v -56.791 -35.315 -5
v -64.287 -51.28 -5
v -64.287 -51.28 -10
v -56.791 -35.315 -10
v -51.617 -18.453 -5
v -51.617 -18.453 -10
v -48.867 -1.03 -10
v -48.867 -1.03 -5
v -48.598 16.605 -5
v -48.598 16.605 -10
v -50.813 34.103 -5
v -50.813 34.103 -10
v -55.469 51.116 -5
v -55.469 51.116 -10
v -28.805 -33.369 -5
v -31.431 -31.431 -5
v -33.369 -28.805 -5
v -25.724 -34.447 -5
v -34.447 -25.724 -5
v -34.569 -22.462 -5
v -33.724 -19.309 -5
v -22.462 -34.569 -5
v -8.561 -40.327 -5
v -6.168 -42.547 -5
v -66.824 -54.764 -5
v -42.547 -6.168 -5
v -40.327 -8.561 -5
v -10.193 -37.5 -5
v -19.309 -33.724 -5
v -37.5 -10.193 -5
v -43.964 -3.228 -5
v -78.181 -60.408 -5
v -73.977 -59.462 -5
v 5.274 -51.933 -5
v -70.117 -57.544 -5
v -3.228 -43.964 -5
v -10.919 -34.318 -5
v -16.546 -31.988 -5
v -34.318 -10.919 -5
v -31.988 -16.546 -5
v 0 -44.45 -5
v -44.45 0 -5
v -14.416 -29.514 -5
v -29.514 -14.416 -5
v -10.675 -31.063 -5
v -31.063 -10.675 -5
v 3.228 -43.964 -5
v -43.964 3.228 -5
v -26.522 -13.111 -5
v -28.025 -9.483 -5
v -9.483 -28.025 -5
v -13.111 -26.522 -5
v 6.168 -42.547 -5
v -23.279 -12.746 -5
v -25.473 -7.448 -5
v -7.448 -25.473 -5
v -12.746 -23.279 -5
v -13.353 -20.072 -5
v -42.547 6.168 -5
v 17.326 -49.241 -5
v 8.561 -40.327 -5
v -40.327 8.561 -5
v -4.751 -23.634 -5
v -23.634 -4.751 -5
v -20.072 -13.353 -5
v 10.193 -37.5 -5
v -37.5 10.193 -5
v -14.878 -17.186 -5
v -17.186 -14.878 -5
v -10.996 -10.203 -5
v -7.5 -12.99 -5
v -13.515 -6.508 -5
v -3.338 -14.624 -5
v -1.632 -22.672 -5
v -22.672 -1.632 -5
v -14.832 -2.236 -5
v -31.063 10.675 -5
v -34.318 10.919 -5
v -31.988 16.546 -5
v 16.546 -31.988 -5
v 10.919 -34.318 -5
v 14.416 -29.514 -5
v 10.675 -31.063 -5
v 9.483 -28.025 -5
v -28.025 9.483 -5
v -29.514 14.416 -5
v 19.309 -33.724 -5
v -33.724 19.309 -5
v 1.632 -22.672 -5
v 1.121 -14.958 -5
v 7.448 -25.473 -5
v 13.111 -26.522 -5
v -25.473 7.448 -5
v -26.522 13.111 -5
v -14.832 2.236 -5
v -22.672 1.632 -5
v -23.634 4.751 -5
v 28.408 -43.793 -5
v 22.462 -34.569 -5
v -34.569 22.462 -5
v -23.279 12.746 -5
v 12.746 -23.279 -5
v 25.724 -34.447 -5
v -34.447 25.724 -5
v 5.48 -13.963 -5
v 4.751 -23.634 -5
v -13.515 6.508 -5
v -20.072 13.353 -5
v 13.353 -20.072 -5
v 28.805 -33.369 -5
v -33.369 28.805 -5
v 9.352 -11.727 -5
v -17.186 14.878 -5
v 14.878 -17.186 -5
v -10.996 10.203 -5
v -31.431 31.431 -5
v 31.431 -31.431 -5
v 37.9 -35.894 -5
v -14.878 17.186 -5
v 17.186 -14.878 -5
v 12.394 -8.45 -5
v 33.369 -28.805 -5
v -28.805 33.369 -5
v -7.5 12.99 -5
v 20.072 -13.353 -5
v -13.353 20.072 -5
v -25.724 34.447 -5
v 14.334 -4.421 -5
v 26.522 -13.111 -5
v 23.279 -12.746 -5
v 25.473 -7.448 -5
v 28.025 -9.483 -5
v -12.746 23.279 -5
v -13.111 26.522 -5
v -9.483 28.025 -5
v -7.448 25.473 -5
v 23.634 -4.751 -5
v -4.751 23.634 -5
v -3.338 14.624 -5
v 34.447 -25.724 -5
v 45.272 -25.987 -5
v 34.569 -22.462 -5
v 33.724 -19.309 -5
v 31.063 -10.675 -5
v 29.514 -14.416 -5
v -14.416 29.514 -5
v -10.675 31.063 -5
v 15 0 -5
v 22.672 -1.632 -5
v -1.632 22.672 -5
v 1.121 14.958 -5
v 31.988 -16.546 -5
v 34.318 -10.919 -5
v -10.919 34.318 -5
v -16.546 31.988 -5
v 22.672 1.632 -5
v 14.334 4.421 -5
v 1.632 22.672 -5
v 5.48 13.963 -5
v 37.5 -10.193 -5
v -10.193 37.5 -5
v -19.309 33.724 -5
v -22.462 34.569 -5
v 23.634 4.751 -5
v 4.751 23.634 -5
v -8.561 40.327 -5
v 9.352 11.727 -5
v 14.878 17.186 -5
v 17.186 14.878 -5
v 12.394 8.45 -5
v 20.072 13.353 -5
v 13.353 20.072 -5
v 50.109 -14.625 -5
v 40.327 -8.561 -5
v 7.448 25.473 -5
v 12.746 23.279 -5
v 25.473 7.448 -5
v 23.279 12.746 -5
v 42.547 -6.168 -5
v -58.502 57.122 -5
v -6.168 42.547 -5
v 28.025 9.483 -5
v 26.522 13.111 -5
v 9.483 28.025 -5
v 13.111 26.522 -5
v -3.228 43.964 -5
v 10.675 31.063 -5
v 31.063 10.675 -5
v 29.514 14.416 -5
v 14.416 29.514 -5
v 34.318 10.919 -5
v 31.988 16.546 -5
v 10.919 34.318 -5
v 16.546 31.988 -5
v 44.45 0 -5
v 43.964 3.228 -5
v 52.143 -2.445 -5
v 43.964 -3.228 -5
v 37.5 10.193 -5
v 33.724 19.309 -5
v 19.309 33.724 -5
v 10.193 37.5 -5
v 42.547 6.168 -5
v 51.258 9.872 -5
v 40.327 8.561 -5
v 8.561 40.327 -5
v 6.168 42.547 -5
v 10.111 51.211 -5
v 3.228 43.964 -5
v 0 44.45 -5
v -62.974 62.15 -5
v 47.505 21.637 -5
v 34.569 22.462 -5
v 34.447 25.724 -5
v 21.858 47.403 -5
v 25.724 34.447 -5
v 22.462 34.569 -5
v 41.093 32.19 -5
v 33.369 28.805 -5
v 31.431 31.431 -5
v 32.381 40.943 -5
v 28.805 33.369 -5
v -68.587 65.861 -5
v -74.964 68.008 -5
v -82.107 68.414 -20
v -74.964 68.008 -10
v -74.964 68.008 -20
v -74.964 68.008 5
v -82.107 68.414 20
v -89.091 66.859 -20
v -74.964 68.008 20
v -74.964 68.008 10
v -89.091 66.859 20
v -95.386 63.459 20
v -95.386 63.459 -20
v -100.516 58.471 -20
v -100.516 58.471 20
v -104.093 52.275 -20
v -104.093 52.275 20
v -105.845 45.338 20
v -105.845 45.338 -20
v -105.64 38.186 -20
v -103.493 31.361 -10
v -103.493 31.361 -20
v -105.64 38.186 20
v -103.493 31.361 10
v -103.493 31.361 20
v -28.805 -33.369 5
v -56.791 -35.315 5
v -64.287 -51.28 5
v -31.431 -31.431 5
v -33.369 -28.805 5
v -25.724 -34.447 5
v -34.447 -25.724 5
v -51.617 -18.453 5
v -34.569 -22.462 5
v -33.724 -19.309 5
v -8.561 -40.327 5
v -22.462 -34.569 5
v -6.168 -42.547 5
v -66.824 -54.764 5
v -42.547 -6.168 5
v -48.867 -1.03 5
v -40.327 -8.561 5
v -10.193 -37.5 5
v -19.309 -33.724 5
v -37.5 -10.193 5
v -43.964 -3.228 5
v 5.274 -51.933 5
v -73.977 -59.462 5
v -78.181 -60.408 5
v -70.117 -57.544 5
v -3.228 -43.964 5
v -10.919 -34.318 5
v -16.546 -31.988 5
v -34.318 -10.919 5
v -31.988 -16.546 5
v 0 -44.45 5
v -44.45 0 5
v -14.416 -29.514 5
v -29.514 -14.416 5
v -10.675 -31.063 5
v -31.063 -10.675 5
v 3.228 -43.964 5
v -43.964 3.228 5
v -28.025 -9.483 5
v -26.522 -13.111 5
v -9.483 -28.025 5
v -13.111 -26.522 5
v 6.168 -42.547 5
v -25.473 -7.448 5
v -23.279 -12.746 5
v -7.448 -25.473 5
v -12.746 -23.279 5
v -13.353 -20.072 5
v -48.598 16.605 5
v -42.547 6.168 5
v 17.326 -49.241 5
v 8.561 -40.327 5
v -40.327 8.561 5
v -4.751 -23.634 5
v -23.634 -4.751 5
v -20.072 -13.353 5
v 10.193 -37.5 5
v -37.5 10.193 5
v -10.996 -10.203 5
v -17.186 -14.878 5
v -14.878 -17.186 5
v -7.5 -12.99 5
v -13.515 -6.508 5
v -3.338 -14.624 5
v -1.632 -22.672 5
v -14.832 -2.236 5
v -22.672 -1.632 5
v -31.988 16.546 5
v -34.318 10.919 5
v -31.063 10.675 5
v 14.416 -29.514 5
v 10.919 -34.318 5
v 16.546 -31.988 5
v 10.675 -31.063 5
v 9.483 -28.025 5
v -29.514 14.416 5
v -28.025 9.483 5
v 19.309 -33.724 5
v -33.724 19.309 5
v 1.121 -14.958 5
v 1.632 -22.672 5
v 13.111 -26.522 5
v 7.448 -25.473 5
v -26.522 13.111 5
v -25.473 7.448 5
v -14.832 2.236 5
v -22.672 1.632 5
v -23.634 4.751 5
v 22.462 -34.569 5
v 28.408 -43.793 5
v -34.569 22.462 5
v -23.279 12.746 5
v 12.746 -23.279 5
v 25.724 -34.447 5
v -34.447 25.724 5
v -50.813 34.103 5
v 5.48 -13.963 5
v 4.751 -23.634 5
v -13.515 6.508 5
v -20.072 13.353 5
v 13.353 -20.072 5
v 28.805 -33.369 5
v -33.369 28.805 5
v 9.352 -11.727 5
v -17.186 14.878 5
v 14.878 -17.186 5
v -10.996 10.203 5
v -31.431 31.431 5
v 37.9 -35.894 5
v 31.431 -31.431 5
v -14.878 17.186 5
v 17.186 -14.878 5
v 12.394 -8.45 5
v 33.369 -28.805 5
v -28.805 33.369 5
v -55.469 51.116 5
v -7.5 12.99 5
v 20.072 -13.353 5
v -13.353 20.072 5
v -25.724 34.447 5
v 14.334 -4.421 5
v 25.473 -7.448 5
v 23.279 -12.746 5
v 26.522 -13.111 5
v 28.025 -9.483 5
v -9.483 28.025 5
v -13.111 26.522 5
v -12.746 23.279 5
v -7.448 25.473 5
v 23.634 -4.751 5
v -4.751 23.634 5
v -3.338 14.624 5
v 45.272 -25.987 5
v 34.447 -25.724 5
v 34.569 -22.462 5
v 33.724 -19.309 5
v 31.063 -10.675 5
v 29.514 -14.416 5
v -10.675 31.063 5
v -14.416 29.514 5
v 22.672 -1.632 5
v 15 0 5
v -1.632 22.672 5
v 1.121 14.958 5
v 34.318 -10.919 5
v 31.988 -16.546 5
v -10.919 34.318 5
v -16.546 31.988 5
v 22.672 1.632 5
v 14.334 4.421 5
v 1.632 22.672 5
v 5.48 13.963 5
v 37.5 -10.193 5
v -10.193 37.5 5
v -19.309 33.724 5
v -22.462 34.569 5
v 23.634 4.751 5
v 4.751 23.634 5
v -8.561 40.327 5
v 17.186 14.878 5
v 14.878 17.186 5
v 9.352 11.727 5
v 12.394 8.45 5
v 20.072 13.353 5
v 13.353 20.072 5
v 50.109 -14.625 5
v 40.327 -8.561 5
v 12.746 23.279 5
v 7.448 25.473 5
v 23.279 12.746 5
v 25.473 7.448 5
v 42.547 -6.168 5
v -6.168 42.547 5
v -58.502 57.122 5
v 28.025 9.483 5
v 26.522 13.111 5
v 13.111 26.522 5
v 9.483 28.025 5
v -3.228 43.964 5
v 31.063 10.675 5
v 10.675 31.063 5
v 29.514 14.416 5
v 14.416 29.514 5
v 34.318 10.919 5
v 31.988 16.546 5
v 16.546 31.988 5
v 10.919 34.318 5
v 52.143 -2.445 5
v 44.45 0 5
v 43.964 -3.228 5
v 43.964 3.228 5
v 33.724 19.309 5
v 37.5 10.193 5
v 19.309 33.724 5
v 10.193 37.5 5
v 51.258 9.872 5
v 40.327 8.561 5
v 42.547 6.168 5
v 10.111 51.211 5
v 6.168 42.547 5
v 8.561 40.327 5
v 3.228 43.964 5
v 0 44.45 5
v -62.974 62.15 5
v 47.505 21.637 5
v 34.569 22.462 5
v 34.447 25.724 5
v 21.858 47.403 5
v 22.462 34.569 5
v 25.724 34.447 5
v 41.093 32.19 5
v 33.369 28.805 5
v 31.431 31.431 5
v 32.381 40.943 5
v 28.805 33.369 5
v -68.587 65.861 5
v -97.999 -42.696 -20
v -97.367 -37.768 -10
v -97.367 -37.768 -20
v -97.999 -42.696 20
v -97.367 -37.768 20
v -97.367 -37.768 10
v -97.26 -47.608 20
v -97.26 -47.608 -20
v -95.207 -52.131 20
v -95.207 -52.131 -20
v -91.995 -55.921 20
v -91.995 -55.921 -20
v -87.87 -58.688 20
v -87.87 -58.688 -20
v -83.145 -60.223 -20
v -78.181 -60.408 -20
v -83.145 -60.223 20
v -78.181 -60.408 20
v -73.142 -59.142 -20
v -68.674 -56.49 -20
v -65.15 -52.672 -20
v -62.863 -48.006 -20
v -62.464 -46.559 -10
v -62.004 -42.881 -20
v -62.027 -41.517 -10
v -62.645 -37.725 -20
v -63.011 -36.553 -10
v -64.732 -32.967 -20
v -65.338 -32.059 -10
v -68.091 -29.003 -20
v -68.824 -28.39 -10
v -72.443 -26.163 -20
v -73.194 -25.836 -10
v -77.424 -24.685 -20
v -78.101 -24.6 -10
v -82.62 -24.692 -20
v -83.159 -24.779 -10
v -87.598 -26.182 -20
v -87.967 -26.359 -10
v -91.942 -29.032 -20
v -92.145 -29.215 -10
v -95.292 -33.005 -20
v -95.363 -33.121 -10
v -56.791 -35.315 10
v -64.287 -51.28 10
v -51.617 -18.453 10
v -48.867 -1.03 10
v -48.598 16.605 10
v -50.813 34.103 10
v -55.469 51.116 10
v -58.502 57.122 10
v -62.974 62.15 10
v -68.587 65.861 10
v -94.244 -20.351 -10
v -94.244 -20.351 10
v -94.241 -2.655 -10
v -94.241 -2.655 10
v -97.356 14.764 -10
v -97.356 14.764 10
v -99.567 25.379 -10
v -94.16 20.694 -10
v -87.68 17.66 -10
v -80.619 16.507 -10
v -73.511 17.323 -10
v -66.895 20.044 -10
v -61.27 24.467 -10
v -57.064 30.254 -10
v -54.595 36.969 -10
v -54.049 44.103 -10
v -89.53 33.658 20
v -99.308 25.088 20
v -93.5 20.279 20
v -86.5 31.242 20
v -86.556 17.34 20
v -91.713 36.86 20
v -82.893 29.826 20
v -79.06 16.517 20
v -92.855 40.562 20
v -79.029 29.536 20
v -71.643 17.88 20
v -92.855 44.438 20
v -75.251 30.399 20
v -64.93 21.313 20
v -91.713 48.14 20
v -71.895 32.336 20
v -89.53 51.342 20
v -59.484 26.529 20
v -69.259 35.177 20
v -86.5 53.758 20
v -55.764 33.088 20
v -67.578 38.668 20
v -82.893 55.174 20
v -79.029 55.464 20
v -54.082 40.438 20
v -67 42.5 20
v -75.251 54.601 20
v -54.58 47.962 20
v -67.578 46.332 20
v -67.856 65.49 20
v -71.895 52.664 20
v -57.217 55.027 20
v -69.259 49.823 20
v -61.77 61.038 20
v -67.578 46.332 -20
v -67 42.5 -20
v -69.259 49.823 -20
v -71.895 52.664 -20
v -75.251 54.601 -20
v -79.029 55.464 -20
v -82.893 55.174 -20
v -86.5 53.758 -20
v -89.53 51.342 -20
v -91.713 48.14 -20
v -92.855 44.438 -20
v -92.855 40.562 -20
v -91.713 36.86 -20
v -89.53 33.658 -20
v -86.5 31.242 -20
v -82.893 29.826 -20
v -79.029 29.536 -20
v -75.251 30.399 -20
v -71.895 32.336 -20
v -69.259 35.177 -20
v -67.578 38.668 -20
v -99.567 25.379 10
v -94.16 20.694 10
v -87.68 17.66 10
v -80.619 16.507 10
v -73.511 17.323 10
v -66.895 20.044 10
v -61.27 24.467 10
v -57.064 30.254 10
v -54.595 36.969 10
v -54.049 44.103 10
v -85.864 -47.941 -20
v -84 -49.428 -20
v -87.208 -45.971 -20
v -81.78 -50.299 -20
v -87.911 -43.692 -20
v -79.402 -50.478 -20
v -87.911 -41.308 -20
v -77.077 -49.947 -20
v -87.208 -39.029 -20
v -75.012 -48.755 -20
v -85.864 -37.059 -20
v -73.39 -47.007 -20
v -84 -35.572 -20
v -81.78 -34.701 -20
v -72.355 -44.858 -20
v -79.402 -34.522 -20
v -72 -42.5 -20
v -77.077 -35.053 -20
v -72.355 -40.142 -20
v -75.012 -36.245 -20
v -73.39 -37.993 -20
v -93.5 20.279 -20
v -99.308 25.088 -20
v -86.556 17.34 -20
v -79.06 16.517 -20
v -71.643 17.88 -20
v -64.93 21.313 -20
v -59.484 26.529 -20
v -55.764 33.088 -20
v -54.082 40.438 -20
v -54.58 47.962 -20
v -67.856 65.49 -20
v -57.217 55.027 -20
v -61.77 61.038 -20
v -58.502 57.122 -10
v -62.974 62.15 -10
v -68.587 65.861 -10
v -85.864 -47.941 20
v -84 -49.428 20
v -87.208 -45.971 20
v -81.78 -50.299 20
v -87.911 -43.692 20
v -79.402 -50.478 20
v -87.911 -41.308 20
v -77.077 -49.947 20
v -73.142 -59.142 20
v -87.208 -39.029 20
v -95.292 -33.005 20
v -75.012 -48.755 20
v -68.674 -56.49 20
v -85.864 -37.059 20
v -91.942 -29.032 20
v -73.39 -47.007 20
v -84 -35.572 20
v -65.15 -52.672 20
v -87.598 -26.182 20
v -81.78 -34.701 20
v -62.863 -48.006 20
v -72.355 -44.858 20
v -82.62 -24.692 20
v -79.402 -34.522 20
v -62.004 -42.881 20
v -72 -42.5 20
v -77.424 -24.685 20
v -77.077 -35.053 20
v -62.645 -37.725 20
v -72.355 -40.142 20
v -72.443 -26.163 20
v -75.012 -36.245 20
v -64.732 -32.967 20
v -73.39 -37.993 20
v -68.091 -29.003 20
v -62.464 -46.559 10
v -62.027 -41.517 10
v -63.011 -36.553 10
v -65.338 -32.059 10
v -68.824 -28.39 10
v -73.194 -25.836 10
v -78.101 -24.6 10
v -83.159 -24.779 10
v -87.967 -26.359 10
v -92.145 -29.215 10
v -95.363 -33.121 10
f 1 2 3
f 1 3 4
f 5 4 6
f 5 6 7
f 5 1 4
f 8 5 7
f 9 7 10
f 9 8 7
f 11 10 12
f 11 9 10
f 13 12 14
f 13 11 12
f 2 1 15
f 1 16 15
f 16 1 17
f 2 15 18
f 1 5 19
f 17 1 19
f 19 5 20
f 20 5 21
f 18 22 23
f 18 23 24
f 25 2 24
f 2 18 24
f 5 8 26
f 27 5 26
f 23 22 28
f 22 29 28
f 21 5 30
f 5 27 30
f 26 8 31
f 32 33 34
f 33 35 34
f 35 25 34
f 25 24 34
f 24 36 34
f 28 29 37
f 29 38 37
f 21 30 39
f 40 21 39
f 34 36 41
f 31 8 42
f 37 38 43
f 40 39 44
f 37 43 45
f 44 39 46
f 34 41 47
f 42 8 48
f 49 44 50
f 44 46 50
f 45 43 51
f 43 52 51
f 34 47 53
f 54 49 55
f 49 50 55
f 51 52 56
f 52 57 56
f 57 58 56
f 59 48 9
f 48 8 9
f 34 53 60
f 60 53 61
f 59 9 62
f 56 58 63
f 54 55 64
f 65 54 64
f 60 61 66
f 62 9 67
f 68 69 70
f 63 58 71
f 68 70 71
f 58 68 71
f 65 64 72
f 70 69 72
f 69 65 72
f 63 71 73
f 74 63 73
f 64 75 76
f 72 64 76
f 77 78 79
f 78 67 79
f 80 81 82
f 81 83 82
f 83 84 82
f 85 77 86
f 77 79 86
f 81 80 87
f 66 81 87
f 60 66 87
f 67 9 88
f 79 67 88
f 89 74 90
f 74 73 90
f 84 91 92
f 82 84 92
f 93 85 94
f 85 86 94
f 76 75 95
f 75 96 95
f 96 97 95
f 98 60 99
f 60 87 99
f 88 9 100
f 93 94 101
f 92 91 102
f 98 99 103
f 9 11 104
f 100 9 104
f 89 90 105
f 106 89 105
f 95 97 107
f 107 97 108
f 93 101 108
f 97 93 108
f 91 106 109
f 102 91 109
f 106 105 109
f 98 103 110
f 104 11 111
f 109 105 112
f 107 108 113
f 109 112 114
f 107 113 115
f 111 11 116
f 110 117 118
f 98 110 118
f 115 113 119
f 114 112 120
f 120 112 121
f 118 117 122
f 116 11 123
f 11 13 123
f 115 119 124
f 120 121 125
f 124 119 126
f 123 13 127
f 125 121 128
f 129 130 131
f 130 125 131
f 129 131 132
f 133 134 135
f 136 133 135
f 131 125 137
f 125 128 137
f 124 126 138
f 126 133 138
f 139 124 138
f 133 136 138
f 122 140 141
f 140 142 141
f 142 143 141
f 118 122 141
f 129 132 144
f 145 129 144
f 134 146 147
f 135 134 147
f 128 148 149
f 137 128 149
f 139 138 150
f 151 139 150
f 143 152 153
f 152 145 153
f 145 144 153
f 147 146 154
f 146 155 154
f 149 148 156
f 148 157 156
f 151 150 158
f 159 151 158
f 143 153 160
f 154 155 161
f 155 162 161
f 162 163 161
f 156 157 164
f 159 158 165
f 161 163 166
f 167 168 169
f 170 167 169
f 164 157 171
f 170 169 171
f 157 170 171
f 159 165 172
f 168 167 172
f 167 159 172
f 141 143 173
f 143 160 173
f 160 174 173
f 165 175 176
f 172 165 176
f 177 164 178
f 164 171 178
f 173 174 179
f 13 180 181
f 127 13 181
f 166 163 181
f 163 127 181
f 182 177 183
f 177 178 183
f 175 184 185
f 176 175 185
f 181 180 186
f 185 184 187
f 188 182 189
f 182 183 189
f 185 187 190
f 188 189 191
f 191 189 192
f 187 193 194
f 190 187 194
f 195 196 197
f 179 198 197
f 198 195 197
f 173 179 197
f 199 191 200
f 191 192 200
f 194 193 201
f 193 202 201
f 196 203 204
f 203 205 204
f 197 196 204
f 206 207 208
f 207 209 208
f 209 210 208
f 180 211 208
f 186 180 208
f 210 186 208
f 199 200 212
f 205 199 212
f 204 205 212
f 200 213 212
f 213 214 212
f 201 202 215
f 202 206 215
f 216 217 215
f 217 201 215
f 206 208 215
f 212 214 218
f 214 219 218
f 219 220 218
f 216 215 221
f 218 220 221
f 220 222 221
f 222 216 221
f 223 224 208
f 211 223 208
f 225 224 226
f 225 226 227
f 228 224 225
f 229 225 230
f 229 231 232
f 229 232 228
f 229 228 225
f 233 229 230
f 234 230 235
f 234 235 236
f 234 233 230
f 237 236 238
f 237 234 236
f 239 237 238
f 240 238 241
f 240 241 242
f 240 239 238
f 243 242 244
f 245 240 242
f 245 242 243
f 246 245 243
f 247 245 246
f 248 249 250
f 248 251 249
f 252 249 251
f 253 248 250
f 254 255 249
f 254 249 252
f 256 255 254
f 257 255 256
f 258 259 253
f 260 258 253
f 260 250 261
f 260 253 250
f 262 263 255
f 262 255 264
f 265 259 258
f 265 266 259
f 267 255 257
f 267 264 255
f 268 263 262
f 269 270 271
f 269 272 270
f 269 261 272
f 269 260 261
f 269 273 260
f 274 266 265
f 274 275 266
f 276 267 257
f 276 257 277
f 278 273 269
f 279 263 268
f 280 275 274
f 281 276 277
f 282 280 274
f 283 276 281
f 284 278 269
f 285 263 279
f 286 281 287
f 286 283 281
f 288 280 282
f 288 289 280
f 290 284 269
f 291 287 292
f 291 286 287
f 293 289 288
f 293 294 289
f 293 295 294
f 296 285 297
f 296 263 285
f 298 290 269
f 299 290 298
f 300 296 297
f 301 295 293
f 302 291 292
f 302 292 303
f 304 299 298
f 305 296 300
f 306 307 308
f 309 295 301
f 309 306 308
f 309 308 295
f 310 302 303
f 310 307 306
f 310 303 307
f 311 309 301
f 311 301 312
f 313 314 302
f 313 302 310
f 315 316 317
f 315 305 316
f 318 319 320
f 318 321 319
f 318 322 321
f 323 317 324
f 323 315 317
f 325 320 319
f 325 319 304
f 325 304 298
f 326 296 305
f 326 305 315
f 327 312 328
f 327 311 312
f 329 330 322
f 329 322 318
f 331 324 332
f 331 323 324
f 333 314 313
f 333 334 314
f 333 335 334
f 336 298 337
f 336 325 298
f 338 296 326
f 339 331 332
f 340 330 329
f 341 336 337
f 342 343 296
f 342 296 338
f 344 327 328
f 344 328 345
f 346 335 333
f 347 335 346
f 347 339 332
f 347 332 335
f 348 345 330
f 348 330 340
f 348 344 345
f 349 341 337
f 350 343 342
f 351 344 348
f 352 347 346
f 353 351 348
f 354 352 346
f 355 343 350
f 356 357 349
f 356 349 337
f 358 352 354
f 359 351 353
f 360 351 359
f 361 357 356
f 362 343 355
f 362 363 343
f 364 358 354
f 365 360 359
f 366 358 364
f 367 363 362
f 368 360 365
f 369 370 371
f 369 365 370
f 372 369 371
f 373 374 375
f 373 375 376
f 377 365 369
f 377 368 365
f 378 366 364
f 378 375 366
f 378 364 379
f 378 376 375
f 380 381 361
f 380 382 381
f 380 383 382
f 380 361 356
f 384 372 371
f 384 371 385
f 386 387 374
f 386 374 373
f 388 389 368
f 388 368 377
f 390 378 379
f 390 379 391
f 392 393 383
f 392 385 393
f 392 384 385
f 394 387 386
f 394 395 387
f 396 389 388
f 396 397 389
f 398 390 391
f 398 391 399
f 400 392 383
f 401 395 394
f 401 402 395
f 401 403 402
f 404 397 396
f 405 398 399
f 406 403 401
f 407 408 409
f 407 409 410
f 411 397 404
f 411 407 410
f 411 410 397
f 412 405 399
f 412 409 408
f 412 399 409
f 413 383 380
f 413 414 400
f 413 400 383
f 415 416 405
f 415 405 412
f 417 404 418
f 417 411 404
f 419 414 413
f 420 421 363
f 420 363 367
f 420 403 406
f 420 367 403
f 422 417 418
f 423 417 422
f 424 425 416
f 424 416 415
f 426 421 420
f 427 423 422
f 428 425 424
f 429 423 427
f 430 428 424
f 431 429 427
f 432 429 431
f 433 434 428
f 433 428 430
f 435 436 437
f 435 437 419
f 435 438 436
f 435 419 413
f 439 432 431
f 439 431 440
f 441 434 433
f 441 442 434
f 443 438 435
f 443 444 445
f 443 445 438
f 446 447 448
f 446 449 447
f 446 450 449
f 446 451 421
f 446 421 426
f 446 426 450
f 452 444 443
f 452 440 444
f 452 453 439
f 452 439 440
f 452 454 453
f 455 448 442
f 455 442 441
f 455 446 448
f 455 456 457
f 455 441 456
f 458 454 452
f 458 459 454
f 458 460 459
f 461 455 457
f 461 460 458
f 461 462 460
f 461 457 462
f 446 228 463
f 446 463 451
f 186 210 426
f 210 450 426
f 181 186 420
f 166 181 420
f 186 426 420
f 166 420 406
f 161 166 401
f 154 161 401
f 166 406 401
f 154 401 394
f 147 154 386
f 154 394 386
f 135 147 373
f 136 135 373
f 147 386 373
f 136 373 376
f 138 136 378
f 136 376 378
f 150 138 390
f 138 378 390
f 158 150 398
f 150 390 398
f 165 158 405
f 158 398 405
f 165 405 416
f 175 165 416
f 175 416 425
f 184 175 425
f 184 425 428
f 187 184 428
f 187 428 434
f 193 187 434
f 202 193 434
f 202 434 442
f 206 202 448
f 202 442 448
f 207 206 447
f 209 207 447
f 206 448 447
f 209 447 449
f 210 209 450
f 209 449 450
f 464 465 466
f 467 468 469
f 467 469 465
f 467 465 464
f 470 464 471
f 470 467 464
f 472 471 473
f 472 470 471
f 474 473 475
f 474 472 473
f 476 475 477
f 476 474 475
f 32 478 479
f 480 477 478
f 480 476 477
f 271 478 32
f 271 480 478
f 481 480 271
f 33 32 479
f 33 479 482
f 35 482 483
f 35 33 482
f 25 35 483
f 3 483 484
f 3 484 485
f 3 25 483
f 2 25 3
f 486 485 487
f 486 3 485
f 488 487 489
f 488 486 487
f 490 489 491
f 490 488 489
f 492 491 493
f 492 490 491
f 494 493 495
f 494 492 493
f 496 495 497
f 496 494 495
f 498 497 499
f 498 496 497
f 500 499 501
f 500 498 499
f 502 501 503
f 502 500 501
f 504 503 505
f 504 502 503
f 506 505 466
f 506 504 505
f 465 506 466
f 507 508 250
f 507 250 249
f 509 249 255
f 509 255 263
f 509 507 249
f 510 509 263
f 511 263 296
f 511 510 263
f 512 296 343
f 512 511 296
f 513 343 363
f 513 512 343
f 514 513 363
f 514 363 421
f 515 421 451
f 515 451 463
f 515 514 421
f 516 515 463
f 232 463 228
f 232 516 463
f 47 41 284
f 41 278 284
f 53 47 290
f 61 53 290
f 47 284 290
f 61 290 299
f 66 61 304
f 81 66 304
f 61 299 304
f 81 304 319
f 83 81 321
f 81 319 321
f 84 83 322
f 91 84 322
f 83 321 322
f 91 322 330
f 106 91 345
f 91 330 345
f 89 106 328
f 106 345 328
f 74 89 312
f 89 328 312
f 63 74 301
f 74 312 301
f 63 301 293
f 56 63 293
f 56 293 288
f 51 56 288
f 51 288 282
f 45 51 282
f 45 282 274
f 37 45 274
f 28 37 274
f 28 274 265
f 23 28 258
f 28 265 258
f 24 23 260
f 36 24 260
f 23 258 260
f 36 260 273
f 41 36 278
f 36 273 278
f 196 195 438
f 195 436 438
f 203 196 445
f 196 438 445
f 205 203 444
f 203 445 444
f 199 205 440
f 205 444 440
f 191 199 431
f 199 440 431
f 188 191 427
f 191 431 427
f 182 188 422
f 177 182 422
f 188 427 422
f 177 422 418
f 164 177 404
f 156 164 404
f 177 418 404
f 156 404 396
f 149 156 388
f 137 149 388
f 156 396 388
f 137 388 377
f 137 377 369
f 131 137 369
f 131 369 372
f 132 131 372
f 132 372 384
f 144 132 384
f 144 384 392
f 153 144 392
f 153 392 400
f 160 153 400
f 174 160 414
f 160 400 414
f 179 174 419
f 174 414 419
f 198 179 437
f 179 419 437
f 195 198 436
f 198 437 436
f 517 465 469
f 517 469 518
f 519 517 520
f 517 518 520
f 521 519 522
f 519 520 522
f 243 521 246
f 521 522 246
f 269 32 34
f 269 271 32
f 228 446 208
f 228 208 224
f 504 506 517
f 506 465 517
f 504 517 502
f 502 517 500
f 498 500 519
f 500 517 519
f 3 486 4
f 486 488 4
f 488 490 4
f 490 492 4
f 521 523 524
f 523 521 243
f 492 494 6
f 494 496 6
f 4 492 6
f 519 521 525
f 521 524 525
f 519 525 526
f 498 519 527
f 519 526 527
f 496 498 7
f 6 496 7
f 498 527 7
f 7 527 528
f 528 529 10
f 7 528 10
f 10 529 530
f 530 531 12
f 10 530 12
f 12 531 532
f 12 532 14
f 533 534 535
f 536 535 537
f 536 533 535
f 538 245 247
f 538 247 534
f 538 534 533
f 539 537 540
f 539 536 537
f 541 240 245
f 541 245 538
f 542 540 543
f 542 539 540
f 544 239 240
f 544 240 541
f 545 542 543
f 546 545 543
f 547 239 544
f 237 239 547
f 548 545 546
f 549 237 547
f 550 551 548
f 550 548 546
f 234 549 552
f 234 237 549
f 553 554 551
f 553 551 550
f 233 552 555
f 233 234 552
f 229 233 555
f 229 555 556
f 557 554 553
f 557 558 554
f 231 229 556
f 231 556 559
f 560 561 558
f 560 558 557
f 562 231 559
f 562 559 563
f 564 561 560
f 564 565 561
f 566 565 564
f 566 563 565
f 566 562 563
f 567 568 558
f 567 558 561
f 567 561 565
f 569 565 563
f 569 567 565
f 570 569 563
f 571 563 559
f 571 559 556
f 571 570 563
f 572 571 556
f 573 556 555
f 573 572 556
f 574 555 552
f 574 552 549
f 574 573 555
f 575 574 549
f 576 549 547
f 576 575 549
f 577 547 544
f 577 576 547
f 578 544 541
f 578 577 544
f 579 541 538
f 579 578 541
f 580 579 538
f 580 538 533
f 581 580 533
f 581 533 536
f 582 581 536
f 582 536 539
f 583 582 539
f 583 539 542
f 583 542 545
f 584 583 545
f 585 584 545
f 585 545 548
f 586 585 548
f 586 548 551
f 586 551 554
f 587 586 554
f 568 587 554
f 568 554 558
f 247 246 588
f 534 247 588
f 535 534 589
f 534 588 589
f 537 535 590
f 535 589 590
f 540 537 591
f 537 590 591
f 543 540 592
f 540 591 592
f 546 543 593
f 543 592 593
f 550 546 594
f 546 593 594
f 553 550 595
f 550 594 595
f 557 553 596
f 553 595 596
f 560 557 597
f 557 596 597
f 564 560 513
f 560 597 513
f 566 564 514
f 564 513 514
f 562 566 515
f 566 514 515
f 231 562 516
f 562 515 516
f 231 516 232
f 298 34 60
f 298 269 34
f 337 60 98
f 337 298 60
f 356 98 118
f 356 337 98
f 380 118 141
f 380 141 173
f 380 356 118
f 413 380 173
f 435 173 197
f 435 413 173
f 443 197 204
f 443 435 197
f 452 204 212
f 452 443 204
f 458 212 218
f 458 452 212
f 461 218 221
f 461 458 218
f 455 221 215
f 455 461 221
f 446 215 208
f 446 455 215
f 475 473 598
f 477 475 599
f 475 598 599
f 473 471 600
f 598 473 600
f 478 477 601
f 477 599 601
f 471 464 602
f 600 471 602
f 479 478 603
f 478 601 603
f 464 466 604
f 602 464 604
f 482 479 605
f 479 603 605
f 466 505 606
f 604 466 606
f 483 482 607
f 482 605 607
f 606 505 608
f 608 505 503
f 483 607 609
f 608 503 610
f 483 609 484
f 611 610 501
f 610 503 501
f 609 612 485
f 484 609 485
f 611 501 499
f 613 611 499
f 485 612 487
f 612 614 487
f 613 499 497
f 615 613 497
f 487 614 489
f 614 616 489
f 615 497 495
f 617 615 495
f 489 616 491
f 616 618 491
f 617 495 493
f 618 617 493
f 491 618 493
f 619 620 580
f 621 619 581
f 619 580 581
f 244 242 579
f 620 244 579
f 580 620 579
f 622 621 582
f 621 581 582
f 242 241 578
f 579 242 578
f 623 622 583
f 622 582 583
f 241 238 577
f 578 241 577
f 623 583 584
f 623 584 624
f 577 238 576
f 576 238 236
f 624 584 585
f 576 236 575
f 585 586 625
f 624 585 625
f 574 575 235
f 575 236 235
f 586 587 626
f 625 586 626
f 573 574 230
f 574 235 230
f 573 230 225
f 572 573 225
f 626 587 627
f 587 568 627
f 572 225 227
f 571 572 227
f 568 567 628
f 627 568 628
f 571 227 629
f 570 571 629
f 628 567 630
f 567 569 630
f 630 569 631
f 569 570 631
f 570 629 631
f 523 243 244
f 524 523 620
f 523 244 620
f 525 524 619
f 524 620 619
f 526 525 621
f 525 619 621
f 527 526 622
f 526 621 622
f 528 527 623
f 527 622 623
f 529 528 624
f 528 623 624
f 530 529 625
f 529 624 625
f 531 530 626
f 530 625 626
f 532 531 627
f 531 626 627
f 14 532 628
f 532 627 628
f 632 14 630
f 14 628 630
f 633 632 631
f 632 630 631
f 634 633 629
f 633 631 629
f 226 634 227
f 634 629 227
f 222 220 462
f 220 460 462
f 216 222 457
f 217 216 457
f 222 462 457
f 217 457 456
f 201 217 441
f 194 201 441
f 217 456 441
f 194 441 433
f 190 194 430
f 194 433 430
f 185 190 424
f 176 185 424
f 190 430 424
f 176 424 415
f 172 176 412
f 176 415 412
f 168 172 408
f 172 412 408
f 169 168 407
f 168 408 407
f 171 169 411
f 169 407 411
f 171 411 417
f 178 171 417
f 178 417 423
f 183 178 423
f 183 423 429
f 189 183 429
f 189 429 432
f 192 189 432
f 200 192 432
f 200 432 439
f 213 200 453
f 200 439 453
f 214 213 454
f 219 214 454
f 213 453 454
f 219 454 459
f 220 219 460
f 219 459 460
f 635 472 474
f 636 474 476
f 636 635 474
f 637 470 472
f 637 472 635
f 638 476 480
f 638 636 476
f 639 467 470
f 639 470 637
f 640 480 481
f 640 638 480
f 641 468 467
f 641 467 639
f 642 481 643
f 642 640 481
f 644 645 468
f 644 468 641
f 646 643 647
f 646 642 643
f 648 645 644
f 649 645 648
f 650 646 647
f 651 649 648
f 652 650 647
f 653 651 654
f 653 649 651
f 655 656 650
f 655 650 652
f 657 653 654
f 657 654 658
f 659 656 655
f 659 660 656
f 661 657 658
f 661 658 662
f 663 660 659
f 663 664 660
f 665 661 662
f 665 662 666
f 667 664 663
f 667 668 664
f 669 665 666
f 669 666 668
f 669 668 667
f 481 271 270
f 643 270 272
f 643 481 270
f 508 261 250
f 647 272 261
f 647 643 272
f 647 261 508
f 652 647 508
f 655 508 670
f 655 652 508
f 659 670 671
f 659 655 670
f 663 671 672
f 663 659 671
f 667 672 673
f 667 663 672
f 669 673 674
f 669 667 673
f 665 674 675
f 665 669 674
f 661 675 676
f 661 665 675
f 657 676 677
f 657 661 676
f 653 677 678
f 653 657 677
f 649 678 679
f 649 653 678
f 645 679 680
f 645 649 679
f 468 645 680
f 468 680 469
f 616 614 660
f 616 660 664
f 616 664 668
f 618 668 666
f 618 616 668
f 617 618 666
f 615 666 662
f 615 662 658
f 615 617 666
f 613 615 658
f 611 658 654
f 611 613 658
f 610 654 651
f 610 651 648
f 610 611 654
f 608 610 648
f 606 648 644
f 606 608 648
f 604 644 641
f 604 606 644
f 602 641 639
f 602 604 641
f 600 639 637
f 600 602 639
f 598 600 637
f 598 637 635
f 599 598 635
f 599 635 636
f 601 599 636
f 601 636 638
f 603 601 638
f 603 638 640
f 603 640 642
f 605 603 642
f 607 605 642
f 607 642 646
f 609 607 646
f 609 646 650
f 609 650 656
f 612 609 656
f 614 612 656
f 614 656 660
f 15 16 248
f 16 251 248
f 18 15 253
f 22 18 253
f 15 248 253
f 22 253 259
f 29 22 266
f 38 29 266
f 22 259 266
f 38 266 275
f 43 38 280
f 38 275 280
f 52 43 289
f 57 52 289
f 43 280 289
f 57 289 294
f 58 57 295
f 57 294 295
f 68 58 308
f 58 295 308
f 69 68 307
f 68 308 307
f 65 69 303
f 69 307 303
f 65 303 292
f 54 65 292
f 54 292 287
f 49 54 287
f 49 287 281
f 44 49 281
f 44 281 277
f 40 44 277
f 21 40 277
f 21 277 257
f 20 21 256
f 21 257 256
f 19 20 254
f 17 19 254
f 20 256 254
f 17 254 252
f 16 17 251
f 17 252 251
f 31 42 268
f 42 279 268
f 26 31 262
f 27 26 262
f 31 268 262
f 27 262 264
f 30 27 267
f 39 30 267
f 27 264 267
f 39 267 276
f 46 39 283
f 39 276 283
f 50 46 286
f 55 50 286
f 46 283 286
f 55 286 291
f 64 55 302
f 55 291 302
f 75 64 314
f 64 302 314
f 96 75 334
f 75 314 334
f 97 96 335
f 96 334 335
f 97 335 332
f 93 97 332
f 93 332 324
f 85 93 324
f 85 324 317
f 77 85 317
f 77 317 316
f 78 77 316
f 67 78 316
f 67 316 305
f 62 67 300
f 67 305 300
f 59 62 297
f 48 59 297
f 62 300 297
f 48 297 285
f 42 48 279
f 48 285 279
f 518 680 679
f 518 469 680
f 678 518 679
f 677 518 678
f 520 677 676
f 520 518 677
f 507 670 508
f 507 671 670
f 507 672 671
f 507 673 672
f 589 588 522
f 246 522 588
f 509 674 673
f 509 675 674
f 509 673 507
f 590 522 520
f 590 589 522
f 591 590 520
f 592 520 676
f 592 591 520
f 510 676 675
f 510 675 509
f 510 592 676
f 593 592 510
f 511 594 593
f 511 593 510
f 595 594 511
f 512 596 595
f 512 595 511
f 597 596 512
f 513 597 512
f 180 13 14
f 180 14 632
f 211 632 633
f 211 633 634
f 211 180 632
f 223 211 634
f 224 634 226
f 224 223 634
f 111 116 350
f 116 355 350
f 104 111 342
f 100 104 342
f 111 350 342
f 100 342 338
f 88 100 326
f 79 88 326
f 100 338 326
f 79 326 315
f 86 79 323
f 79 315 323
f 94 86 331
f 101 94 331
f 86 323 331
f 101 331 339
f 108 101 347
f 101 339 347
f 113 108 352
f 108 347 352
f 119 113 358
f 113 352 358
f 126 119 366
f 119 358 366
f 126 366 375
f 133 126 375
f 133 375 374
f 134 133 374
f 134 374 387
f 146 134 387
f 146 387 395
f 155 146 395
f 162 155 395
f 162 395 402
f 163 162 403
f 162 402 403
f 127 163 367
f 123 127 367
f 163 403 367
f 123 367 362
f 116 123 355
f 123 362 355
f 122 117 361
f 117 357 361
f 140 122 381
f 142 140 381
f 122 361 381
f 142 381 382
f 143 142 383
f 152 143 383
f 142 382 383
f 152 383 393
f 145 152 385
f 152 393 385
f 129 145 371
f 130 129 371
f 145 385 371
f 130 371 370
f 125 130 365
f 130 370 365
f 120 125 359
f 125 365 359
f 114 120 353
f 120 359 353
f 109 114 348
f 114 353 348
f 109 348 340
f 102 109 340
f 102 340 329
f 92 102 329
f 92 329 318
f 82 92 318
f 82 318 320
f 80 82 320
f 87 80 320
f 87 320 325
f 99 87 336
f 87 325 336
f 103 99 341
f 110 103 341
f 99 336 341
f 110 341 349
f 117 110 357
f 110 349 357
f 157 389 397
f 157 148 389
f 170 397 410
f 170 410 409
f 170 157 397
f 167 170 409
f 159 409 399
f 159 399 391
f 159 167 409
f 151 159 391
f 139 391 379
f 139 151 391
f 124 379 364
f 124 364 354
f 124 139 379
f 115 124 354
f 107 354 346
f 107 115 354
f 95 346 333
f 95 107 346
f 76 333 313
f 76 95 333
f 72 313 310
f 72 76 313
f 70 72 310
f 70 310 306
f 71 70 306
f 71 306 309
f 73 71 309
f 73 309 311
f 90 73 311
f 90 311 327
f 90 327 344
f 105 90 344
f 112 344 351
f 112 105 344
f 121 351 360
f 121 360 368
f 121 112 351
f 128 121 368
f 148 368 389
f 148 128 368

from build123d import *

# Parameters (mm, degrees)
SKETCH_R           = 15
SKETCH_R_2         = 8
SKETCH_R_3         = 13
PAD_DEPTH          = 5
SKETCH001_R        = 10.95
POCKET_DEPTH       = 413.746593
POCKET_DEPTH_BACK  = 413.746593
POLARPATTERN_COUNT = 8
SKETCH002_R        = 8
SKETCH002_R_2      = 13
PAD001_DEPTH       = 10
SKETCH003_R        = 13
SKETCH003_R_2      = 8
PAD002_DEPTH       = 20


with BuildPart() as part:
    # Sketch → Pad (new body, symmetric)
    with BuildSketch(Plane.XY):
        with BuildLine():
            ThreePointArc((5.273855, -51.932903), (52.142702, -2.445125), (10.110599, 51.211481))
            Line((10.110599, 51.211481), (-74.964069, 68.007634))
            ThreePointArc((-74.964069, 68.007634), (-100.516168, 58.471439), (-103.492932, 31.360784))
            ThreePointArc((-97.367005, -37.768495), (-94.240703, -2.65539), (-103.492932, 31.360784))
            ThreePointArc((-97.367005, -37.768495), (-93.732228, -54.137264), (-78.181429, -60.407898))
            Line((-78.181429, -60.407898), (5.273855, -51.932903))
        make_face()
        Circle(SKETCH_R, mode=Mode.SUBTRACT)
        with Locations((-80, -42.5)):
            Circle(SKETCH_R_2, mode=Mode.SUBTRACT)
        with Locations((-80, 42.5)):
            Circle(SKETCH_R_3, mode=Mode.SUBTRACT)
    extrude(amount=PAD_DEPTH, both=True)

    # Sketch001 → Pocket (cut, two sides)
    with BuildSketch(Plane.XY) as pocket_sk:
        with Locations((33.5, 0)):
            Circle(SKETCH001_R)
    pocket = extrude(amount=-POCKET_DEPTH, mode=Mode.SUBTRACT) + extrude(pocket_sk.sketch, amount=POCKET_DEPTH_BACK, mode=Mode.SUBTRACT)

    # PolarPattern: Pocket ×8 about axis
    polarpattern_axis = Axis((0, 0, 0), (0, 0, 1))
    for i in range(1, POLARPATTERN_COUNT):
        add(pocket.rotate(polarpattern_axis, i * 360 / POLARPATTERN_COUNT), mode=Mode.SUBTRACT)

    # Sketch002 → Pad001 (join, symmetric)
    with BuildSketch(Plane.XY):
        with BuildLine():
            ThreePointArc((-74.964069, 68.007634), (-100.516168, 58.471439), (-103.492932, 31.360784))
            ThreePointArc((-97.367005, -37.768495), (-94.240703, -2.65539), (-103.492932, 31.360784))
            ThreePointArc((-97.367005, -37.768495), (-93.732228, -54.137264), (-78.181429, -60.407898))
            ThreePointArc((-78.181429, -60.407898), (-70.117222, -57.544291), (-64.286757, -51.280319))
            ThreePointArc((-64.286757, -51.280319), (-48.867416, -1.030474), (-55.469, 51.115686))
            ThreePointArc((-55.469, 51.115686), (-62.973981, 62.149801), (-74.964069, 68.007634))
        make_face()
        with Locations((-80, -42.5)):
            Circle(SKETCH002_R, mode=Mode.SUBTRACT)
        with Locations((-80, 42.5)):
            Circle(SKETCH002_R_2, mode=Mode.SUBTRACT)
    extrude(amount=PAD001_DEPTH, both=True)

    # Sketch003 → Pad002 (join, symmetric)
    with BuildSketch(Plane.XY):
        with BuildLine():
            ThreePointArc((-74.964069, 68.007634), (-100.516168, 58.471439), (-103.492932, 31.360784))
            ThreePointArc((-103.492932, 31.360784), (-59.483832, 26.528561), (-74.964069, 68.007634))
        make_face()
        with Locations((-80, 42.5)):
            Circle(SKETCH003_R, mode=Mode.SUBTRACT)
        with BuildLine():
            ThreePointArc((-97.367005, -37.768495), (-93.732228, -54.137264), (-78.181429, -60.407898))
            ThreePointArc((-78.181429, -60.407898), (-66.267772, -30.862736), (-97.367005, -37.768495))
        make_face()
        with Locations((-80, -42.5)):
            Circle(SKETCH003_R_2, mode=Mode.SUBTRACT)
    extrude(amount=PAD002_DEPTH, both=True)


solid = part.part
